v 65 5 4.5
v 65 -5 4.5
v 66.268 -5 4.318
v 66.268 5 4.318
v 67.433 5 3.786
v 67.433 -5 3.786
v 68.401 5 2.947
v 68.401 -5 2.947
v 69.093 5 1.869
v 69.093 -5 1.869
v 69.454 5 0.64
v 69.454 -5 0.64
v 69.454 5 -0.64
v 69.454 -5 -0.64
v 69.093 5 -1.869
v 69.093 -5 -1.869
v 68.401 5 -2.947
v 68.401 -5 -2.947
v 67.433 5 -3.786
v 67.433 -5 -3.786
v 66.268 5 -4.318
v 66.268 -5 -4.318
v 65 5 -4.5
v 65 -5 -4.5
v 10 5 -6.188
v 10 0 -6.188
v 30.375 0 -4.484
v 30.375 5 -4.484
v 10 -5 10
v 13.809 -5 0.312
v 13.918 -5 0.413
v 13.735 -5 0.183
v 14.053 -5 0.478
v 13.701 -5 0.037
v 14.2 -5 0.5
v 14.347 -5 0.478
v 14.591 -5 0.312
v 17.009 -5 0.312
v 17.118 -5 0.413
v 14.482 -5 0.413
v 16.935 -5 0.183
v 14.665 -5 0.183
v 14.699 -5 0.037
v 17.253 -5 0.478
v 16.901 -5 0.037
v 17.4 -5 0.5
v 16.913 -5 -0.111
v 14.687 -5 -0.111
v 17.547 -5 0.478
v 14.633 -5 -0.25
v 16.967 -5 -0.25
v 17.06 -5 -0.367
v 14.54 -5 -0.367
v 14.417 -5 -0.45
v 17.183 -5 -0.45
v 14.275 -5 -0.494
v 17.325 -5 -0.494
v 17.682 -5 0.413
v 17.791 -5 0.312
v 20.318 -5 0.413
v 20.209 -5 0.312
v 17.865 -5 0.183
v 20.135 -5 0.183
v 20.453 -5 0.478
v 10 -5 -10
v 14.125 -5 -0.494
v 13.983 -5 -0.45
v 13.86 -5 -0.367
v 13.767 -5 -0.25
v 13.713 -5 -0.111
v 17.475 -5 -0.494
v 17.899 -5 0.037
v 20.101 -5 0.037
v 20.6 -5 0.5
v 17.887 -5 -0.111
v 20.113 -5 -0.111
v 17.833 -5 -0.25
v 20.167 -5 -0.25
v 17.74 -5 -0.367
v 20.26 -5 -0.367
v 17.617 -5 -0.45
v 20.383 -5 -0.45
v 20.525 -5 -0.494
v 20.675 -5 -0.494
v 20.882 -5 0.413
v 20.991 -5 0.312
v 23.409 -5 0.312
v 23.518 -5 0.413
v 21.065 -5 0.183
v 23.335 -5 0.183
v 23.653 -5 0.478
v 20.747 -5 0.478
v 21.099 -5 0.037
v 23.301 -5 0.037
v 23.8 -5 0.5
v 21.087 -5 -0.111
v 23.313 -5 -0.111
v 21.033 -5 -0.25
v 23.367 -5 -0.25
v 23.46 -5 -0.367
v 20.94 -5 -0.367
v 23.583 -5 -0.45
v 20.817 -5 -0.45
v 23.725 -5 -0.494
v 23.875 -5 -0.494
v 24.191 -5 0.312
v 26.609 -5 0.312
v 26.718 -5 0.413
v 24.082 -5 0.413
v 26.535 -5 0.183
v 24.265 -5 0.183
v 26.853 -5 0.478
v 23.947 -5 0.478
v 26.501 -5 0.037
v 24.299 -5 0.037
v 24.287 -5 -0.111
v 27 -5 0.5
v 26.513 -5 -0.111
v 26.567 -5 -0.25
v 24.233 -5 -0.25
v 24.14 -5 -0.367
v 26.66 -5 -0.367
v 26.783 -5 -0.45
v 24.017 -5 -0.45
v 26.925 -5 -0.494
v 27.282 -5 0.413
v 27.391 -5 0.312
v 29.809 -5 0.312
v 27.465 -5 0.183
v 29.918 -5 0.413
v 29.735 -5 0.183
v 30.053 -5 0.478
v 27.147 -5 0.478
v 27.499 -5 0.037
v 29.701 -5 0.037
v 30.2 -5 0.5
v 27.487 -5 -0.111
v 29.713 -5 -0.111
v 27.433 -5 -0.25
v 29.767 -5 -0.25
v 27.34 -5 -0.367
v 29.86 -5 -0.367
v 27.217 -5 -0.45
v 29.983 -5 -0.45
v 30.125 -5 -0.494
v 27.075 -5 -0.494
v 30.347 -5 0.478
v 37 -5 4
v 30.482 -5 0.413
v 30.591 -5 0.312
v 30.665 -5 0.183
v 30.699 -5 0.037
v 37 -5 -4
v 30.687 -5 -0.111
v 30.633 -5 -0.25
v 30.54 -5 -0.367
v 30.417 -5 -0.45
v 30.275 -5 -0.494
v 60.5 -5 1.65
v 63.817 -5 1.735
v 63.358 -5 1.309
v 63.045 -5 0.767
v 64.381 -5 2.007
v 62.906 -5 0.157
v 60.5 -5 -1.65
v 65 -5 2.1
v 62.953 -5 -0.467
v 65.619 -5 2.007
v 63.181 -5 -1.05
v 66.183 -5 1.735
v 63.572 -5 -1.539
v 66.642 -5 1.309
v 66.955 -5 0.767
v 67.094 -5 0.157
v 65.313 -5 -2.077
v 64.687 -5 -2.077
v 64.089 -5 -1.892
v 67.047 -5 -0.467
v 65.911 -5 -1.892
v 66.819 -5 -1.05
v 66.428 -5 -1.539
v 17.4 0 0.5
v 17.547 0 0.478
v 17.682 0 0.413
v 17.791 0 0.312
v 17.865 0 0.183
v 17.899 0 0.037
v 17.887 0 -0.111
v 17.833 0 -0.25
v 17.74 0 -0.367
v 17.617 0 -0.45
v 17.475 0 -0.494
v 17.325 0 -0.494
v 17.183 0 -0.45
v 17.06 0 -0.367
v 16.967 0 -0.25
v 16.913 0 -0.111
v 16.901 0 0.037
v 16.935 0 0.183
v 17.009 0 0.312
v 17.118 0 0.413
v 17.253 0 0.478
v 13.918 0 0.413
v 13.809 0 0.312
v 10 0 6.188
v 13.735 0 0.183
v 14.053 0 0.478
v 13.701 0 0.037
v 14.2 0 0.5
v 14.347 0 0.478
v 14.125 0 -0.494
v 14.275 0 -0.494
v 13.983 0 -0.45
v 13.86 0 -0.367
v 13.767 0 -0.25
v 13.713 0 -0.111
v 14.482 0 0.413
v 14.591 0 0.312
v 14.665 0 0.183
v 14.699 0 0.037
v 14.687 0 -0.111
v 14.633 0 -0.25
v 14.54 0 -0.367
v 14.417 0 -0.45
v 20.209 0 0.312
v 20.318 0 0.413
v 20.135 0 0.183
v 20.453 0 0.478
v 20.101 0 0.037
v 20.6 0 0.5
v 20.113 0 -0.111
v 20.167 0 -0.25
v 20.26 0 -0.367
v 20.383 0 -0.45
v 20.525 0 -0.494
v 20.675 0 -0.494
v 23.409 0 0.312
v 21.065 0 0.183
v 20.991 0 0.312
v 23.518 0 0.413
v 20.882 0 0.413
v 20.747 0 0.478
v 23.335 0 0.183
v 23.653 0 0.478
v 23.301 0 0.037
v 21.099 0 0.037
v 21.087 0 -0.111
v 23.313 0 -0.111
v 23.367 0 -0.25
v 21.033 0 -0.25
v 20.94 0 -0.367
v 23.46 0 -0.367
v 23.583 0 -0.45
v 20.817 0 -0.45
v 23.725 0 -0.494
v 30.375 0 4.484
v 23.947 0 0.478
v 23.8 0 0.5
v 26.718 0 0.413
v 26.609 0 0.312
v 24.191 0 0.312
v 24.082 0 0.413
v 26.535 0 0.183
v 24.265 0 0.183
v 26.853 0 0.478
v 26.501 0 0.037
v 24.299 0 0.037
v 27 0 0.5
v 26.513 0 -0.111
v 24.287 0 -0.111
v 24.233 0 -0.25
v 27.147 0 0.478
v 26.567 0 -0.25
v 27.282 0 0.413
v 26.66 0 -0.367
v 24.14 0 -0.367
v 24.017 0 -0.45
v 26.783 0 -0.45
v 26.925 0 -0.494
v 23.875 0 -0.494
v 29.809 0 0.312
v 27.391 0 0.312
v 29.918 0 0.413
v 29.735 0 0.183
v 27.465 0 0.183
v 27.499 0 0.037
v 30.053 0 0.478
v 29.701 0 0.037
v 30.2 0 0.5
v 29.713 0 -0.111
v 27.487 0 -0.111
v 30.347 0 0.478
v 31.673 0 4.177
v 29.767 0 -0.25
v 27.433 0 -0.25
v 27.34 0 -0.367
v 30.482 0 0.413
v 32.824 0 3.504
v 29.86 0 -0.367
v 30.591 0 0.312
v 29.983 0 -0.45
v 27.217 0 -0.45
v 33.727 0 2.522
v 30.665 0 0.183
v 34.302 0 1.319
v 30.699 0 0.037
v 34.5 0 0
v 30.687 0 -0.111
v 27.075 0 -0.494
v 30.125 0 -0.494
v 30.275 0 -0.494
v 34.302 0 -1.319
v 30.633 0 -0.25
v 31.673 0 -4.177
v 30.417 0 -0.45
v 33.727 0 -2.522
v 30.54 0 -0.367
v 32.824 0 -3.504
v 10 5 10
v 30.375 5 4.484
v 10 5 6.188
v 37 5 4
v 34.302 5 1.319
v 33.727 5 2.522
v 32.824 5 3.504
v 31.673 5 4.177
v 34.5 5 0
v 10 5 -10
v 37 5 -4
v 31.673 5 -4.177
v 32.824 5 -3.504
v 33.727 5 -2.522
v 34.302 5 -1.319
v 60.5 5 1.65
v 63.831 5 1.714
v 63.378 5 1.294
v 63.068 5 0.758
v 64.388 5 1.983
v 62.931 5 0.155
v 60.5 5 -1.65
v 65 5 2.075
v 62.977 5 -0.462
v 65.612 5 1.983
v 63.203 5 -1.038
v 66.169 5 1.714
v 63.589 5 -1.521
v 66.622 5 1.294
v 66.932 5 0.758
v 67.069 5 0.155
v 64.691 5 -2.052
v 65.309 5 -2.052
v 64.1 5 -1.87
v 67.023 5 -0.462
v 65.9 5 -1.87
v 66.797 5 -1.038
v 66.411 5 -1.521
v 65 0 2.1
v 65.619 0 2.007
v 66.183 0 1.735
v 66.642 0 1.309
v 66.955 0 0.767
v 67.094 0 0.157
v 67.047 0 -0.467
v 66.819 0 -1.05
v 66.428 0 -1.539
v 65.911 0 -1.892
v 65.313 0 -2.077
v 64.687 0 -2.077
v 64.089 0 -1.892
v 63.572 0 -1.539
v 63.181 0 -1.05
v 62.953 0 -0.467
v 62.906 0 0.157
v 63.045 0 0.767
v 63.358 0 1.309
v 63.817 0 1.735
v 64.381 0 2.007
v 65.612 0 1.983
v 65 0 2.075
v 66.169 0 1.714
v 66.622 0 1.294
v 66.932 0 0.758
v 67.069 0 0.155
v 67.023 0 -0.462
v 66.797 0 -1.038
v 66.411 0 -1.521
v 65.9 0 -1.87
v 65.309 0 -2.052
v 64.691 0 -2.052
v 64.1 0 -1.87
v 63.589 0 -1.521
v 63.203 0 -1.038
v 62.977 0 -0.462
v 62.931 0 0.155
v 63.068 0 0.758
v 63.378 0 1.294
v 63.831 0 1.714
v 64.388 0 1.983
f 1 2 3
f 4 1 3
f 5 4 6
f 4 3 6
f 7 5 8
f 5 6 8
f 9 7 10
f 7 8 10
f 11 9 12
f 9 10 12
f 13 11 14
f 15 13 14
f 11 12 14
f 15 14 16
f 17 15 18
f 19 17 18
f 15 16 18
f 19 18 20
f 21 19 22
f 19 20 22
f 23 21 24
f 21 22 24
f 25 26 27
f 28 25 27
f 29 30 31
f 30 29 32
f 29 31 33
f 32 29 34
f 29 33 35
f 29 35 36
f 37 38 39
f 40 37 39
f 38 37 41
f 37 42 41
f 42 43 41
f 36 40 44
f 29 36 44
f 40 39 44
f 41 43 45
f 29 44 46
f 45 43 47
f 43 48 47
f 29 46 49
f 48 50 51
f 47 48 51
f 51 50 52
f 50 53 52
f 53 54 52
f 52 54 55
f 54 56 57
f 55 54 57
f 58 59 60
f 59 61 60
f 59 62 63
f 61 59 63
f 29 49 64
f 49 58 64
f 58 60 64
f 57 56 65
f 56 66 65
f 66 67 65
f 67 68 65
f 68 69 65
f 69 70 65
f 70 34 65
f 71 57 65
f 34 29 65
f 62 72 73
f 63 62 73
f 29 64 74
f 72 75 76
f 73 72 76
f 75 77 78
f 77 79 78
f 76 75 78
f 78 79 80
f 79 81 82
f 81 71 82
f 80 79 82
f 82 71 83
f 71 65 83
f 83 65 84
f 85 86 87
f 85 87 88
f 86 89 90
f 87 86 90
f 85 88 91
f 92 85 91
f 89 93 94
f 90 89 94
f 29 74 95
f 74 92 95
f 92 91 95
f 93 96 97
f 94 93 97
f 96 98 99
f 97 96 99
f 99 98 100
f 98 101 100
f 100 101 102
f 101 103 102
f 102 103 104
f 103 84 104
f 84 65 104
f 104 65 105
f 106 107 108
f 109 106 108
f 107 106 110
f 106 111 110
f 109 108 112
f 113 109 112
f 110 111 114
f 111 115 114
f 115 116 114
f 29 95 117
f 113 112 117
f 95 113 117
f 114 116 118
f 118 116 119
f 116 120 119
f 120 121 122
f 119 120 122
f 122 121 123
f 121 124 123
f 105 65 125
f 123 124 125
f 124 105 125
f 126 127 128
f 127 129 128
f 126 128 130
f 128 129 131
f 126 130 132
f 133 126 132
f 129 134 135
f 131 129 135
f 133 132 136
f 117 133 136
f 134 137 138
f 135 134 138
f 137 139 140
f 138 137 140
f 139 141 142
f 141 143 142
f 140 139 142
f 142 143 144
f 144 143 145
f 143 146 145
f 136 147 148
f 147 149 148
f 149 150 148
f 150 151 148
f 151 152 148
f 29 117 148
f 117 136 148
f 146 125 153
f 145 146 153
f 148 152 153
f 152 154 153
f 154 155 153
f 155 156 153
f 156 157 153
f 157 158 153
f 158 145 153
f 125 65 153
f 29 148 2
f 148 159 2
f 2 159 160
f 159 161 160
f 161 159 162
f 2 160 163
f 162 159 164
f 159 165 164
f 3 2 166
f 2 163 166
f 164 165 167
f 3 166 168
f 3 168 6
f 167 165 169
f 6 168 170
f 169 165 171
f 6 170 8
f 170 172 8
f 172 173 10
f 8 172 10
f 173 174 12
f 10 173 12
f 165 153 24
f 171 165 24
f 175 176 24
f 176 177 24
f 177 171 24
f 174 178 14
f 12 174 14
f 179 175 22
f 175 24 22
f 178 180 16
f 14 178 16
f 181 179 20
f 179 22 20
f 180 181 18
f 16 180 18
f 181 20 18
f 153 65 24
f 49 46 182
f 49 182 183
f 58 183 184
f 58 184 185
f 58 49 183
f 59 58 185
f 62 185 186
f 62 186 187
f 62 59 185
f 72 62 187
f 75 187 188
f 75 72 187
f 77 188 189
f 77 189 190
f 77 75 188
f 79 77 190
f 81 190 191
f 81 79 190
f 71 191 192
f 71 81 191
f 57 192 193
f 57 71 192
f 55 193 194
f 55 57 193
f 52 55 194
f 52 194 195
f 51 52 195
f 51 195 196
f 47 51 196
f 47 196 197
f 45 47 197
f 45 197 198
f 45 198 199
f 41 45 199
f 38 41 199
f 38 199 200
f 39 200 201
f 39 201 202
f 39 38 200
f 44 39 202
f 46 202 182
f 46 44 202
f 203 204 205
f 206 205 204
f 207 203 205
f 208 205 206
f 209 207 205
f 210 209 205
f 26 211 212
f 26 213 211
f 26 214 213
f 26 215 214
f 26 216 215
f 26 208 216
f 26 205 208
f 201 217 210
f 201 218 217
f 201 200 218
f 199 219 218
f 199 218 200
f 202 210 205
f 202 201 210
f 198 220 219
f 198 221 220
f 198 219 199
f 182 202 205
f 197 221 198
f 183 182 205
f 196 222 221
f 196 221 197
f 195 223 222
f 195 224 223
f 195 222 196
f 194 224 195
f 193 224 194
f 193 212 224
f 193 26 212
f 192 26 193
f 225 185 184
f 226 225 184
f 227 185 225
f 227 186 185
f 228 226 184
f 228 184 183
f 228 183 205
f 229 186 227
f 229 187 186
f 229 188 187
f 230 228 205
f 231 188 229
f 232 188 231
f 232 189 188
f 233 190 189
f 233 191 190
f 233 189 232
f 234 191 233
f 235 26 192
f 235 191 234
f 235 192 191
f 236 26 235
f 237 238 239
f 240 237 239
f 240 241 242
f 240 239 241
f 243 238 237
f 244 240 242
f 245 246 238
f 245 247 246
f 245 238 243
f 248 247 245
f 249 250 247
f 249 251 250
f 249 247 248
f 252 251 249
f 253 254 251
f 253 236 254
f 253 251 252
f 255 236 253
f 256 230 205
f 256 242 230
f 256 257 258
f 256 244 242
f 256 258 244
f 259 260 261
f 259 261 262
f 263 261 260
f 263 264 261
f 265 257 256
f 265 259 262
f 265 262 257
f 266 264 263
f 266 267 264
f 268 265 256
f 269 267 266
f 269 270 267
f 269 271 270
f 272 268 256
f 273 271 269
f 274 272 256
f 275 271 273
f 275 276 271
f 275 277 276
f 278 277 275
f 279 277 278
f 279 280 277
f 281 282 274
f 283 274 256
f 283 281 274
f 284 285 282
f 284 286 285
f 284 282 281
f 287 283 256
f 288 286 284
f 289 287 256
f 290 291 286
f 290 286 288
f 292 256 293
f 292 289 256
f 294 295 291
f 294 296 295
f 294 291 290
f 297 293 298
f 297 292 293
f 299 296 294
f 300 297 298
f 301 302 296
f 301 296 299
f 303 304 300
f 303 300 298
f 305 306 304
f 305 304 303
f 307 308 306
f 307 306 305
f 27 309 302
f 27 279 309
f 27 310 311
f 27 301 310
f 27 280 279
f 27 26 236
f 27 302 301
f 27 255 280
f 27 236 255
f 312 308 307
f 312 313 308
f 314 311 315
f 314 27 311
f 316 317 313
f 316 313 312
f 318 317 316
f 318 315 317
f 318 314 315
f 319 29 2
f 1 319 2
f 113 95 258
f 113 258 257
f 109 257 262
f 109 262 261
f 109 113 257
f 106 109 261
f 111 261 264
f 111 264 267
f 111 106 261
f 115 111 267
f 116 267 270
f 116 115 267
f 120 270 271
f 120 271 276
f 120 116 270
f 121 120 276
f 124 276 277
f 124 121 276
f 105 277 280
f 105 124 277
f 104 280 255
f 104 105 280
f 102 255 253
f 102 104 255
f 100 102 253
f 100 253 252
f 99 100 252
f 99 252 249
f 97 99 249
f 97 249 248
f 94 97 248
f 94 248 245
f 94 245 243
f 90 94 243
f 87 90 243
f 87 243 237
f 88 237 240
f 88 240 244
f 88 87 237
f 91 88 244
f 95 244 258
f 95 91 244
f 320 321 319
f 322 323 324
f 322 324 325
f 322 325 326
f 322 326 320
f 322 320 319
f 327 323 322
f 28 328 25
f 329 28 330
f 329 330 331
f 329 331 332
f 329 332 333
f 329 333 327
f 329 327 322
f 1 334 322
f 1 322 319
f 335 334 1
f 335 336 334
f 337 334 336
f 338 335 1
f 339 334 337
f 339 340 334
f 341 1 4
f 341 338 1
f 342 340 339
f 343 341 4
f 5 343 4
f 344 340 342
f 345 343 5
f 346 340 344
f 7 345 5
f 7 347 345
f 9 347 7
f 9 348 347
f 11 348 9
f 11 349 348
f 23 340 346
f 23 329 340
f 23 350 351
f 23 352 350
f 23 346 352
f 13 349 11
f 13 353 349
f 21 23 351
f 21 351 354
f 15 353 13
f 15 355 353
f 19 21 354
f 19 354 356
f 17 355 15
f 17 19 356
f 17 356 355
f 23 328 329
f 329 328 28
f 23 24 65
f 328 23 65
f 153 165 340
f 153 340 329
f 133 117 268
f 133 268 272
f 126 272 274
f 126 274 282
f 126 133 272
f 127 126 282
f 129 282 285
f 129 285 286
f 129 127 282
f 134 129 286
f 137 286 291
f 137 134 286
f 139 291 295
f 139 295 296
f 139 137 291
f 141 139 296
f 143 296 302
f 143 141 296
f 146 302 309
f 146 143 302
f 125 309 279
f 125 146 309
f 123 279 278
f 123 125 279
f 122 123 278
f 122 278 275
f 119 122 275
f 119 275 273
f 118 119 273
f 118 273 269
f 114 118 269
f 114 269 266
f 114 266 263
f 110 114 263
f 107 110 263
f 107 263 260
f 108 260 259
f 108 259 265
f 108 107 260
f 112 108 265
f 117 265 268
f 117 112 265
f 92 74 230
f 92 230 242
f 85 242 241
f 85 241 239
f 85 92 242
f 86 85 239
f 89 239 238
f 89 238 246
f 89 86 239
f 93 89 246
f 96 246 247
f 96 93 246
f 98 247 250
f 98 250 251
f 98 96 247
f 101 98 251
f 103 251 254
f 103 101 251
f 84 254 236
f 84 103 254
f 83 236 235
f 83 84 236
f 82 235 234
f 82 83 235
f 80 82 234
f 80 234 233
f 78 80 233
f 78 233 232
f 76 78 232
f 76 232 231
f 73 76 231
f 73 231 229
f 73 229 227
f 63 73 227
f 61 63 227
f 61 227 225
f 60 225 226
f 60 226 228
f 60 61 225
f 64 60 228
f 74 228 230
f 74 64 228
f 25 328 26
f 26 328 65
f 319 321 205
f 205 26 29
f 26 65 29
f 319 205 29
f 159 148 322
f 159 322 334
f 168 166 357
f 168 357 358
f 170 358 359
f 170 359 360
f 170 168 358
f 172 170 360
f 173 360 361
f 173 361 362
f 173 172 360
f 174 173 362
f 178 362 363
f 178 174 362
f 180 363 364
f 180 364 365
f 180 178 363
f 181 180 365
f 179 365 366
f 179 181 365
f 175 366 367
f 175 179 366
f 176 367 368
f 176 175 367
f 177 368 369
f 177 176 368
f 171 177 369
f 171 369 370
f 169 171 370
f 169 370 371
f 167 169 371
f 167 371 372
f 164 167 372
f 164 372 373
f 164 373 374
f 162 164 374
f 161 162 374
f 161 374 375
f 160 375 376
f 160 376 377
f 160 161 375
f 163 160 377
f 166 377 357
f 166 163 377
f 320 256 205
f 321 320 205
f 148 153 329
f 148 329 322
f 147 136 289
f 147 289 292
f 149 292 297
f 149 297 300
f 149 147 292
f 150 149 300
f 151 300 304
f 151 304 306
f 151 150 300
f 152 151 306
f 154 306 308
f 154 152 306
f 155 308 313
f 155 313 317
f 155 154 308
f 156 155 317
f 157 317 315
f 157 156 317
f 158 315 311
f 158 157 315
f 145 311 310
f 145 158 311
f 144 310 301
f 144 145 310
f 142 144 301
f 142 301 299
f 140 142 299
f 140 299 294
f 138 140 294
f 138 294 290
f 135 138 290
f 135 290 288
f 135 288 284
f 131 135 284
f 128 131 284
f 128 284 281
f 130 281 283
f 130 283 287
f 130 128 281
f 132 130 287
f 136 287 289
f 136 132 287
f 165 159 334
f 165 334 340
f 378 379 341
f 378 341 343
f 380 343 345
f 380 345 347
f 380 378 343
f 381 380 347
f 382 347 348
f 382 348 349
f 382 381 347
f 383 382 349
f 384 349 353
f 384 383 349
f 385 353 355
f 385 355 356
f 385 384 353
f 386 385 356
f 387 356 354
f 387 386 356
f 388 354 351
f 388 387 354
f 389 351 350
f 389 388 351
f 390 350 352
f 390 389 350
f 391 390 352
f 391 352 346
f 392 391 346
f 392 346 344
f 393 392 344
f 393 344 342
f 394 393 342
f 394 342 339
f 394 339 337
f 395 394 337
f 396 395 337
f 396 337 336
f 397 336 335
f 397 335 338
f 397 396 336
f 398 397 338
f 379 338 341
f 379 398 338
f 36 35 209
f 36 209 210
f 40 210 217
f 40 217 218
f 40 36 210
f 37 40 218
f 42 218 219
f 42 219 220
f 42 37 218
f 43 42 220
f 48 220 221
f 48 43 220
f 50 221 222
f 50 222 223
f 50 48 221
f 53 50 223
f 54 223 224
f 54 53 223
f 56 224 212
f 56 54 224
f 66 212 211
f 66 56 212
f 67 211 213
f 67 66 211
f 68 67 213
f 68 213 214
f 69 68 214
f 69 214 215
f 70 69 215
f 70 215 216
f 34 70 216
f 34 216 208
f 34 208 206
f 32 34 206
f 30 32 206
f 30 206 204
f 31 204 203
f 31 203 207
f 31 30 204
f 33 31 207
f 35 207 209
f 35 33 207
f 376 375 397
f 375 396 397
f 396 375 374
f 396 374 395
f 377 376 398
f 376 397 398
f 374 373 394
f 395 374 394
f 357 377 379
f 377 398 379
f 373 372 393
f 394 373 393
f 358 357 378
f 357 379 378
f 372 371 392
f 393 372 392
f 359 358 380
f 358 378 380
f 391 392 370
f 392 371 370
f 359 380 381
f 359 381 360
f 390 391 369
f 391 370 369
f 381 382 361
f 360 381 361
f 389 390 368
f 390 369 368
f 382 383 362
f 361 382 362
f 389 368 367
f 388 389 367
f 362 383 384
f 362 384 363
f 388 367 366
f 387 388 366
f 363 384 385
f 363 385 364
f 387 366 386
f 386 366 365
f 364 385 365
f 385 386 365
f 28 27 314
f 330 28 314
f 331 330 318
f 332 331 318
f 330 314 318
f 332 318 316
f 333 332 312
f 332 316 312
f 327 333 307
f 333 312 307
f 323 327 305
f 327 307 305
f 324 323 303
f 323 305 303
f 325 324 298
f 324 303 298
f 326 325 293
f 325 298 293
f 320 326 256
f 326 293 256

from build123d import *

# Parameters (mm, degrees)
SKETCH1_R               = 2.075
BOSS_EXTRUDE1_DEPTH     = 5
BOSS_EXTRUDE4_START     = -5
SKETCH4_R               = 0.5
SKETCH4_R_2             = 2.1
BOSS_EXTRUDE4_DEPTH     = 5
CUT_EXTRUDE1_DEPTH      = 5
CUT_EXTRUDE1_DEPTH_BACK = 5


with BuildPart() as part:
    # Sketch1 → Boss-Extrude1 (new body)
    with BuildSketch(Plane(origin=(0, 0, 0), x_dir=(1, 0, 0), z_dir=(0, 1, 0))):
        with BuildLine():
            Line((65, 4.5), (10, 10))
            Line((10, 10), (10, 6.188190874))
            Line((10, 6.188190874), (30.375, 4.484347779))
            ThreePointArc((30.375, 4.484347779), (34.5, 0), (30.375, -4.484347779))
            Line((30.375, -4.484347779), (10, -6.188190874))
            Line((10, -6.188190874), (10, -10))
            Line((10, -10), (65, -4.5))
            ThreePointArc((65, -4.5), (69.5, 0), (65, 4.5))
        make_face()
        with Locations((65, 0)):
            Circle(SKETCH1_R, mode=Mode.SUBTRACT)
    extrude(amount=BOSS_EXTRUDE1_DEPTH)

    # Sketch4 → Boss-Extrude4 (add)
    with BuildSketch(Plane(origin=(0, 0, 0), x_dir=(1, 0, 0), z_dir=(0, 1, 0)).offset(BOSS_EXTRUDE4_START)):
        with BuildLine():
            Line((10, 10), (10, -10))
            Line((10, -10), (65, -4.5))
            ThreePointArc((65, -4.5), (69.5, 0), (65, 4.5))
            Line((65, 4.5), (10, 10))
        make_face()
        with Locations((14.2, 0)):
            Circle(SKETCH4_R, mode=Mode.SUBTRACT)
        with Locations((17.4, 0)):
            Circle(SKETCH4_R, mode=Mode.SUBTRACT)
        with Locations((20.6, 0)):
            Circle(SKETCH4_R, mode=Mode.SUBTRACT)
        with Locations((23.8, 0)):
            Circle(SKETCH4_R, mode=Mode.SUBTRACT)
        with Locations((27, 0)):
            Circle(SKETCH4_R, mode=Mode.SUBTRACT)
        with Locations((30.2, 0)):
            Circle(SKETCH4_R, mode=Mode.SUBTRACT)
        with Locations((65, 0)):
            Circle(SKETCH4_R_2, mode=Mode.SUBTRACT)
    extrude(amount=BOSS_EXTRUDE4_DEPTH)

    # Sketch3 → Cut-Extrude1 (cut, two sides: drawn at the far end of the back side and taken through both)
    with BuildSketch(Plane(origin=(0, 0, 0), x_dir=(1, 0, 0), z_dir=(0, 1, 0)).offset(-CUT_EXTRUDE1_DEPTH_BACK)):
        Polygon((60.5, -1.65), (60.5, 1.65), (37, 4), (37, -4), align=None)
    extrude(amount=CUT_EXTRUDE1_DEPTH + CUT_EXTRUDE1_DEPTH_BACK, mode=Mode.SUBTRACT)


solid = part.part
